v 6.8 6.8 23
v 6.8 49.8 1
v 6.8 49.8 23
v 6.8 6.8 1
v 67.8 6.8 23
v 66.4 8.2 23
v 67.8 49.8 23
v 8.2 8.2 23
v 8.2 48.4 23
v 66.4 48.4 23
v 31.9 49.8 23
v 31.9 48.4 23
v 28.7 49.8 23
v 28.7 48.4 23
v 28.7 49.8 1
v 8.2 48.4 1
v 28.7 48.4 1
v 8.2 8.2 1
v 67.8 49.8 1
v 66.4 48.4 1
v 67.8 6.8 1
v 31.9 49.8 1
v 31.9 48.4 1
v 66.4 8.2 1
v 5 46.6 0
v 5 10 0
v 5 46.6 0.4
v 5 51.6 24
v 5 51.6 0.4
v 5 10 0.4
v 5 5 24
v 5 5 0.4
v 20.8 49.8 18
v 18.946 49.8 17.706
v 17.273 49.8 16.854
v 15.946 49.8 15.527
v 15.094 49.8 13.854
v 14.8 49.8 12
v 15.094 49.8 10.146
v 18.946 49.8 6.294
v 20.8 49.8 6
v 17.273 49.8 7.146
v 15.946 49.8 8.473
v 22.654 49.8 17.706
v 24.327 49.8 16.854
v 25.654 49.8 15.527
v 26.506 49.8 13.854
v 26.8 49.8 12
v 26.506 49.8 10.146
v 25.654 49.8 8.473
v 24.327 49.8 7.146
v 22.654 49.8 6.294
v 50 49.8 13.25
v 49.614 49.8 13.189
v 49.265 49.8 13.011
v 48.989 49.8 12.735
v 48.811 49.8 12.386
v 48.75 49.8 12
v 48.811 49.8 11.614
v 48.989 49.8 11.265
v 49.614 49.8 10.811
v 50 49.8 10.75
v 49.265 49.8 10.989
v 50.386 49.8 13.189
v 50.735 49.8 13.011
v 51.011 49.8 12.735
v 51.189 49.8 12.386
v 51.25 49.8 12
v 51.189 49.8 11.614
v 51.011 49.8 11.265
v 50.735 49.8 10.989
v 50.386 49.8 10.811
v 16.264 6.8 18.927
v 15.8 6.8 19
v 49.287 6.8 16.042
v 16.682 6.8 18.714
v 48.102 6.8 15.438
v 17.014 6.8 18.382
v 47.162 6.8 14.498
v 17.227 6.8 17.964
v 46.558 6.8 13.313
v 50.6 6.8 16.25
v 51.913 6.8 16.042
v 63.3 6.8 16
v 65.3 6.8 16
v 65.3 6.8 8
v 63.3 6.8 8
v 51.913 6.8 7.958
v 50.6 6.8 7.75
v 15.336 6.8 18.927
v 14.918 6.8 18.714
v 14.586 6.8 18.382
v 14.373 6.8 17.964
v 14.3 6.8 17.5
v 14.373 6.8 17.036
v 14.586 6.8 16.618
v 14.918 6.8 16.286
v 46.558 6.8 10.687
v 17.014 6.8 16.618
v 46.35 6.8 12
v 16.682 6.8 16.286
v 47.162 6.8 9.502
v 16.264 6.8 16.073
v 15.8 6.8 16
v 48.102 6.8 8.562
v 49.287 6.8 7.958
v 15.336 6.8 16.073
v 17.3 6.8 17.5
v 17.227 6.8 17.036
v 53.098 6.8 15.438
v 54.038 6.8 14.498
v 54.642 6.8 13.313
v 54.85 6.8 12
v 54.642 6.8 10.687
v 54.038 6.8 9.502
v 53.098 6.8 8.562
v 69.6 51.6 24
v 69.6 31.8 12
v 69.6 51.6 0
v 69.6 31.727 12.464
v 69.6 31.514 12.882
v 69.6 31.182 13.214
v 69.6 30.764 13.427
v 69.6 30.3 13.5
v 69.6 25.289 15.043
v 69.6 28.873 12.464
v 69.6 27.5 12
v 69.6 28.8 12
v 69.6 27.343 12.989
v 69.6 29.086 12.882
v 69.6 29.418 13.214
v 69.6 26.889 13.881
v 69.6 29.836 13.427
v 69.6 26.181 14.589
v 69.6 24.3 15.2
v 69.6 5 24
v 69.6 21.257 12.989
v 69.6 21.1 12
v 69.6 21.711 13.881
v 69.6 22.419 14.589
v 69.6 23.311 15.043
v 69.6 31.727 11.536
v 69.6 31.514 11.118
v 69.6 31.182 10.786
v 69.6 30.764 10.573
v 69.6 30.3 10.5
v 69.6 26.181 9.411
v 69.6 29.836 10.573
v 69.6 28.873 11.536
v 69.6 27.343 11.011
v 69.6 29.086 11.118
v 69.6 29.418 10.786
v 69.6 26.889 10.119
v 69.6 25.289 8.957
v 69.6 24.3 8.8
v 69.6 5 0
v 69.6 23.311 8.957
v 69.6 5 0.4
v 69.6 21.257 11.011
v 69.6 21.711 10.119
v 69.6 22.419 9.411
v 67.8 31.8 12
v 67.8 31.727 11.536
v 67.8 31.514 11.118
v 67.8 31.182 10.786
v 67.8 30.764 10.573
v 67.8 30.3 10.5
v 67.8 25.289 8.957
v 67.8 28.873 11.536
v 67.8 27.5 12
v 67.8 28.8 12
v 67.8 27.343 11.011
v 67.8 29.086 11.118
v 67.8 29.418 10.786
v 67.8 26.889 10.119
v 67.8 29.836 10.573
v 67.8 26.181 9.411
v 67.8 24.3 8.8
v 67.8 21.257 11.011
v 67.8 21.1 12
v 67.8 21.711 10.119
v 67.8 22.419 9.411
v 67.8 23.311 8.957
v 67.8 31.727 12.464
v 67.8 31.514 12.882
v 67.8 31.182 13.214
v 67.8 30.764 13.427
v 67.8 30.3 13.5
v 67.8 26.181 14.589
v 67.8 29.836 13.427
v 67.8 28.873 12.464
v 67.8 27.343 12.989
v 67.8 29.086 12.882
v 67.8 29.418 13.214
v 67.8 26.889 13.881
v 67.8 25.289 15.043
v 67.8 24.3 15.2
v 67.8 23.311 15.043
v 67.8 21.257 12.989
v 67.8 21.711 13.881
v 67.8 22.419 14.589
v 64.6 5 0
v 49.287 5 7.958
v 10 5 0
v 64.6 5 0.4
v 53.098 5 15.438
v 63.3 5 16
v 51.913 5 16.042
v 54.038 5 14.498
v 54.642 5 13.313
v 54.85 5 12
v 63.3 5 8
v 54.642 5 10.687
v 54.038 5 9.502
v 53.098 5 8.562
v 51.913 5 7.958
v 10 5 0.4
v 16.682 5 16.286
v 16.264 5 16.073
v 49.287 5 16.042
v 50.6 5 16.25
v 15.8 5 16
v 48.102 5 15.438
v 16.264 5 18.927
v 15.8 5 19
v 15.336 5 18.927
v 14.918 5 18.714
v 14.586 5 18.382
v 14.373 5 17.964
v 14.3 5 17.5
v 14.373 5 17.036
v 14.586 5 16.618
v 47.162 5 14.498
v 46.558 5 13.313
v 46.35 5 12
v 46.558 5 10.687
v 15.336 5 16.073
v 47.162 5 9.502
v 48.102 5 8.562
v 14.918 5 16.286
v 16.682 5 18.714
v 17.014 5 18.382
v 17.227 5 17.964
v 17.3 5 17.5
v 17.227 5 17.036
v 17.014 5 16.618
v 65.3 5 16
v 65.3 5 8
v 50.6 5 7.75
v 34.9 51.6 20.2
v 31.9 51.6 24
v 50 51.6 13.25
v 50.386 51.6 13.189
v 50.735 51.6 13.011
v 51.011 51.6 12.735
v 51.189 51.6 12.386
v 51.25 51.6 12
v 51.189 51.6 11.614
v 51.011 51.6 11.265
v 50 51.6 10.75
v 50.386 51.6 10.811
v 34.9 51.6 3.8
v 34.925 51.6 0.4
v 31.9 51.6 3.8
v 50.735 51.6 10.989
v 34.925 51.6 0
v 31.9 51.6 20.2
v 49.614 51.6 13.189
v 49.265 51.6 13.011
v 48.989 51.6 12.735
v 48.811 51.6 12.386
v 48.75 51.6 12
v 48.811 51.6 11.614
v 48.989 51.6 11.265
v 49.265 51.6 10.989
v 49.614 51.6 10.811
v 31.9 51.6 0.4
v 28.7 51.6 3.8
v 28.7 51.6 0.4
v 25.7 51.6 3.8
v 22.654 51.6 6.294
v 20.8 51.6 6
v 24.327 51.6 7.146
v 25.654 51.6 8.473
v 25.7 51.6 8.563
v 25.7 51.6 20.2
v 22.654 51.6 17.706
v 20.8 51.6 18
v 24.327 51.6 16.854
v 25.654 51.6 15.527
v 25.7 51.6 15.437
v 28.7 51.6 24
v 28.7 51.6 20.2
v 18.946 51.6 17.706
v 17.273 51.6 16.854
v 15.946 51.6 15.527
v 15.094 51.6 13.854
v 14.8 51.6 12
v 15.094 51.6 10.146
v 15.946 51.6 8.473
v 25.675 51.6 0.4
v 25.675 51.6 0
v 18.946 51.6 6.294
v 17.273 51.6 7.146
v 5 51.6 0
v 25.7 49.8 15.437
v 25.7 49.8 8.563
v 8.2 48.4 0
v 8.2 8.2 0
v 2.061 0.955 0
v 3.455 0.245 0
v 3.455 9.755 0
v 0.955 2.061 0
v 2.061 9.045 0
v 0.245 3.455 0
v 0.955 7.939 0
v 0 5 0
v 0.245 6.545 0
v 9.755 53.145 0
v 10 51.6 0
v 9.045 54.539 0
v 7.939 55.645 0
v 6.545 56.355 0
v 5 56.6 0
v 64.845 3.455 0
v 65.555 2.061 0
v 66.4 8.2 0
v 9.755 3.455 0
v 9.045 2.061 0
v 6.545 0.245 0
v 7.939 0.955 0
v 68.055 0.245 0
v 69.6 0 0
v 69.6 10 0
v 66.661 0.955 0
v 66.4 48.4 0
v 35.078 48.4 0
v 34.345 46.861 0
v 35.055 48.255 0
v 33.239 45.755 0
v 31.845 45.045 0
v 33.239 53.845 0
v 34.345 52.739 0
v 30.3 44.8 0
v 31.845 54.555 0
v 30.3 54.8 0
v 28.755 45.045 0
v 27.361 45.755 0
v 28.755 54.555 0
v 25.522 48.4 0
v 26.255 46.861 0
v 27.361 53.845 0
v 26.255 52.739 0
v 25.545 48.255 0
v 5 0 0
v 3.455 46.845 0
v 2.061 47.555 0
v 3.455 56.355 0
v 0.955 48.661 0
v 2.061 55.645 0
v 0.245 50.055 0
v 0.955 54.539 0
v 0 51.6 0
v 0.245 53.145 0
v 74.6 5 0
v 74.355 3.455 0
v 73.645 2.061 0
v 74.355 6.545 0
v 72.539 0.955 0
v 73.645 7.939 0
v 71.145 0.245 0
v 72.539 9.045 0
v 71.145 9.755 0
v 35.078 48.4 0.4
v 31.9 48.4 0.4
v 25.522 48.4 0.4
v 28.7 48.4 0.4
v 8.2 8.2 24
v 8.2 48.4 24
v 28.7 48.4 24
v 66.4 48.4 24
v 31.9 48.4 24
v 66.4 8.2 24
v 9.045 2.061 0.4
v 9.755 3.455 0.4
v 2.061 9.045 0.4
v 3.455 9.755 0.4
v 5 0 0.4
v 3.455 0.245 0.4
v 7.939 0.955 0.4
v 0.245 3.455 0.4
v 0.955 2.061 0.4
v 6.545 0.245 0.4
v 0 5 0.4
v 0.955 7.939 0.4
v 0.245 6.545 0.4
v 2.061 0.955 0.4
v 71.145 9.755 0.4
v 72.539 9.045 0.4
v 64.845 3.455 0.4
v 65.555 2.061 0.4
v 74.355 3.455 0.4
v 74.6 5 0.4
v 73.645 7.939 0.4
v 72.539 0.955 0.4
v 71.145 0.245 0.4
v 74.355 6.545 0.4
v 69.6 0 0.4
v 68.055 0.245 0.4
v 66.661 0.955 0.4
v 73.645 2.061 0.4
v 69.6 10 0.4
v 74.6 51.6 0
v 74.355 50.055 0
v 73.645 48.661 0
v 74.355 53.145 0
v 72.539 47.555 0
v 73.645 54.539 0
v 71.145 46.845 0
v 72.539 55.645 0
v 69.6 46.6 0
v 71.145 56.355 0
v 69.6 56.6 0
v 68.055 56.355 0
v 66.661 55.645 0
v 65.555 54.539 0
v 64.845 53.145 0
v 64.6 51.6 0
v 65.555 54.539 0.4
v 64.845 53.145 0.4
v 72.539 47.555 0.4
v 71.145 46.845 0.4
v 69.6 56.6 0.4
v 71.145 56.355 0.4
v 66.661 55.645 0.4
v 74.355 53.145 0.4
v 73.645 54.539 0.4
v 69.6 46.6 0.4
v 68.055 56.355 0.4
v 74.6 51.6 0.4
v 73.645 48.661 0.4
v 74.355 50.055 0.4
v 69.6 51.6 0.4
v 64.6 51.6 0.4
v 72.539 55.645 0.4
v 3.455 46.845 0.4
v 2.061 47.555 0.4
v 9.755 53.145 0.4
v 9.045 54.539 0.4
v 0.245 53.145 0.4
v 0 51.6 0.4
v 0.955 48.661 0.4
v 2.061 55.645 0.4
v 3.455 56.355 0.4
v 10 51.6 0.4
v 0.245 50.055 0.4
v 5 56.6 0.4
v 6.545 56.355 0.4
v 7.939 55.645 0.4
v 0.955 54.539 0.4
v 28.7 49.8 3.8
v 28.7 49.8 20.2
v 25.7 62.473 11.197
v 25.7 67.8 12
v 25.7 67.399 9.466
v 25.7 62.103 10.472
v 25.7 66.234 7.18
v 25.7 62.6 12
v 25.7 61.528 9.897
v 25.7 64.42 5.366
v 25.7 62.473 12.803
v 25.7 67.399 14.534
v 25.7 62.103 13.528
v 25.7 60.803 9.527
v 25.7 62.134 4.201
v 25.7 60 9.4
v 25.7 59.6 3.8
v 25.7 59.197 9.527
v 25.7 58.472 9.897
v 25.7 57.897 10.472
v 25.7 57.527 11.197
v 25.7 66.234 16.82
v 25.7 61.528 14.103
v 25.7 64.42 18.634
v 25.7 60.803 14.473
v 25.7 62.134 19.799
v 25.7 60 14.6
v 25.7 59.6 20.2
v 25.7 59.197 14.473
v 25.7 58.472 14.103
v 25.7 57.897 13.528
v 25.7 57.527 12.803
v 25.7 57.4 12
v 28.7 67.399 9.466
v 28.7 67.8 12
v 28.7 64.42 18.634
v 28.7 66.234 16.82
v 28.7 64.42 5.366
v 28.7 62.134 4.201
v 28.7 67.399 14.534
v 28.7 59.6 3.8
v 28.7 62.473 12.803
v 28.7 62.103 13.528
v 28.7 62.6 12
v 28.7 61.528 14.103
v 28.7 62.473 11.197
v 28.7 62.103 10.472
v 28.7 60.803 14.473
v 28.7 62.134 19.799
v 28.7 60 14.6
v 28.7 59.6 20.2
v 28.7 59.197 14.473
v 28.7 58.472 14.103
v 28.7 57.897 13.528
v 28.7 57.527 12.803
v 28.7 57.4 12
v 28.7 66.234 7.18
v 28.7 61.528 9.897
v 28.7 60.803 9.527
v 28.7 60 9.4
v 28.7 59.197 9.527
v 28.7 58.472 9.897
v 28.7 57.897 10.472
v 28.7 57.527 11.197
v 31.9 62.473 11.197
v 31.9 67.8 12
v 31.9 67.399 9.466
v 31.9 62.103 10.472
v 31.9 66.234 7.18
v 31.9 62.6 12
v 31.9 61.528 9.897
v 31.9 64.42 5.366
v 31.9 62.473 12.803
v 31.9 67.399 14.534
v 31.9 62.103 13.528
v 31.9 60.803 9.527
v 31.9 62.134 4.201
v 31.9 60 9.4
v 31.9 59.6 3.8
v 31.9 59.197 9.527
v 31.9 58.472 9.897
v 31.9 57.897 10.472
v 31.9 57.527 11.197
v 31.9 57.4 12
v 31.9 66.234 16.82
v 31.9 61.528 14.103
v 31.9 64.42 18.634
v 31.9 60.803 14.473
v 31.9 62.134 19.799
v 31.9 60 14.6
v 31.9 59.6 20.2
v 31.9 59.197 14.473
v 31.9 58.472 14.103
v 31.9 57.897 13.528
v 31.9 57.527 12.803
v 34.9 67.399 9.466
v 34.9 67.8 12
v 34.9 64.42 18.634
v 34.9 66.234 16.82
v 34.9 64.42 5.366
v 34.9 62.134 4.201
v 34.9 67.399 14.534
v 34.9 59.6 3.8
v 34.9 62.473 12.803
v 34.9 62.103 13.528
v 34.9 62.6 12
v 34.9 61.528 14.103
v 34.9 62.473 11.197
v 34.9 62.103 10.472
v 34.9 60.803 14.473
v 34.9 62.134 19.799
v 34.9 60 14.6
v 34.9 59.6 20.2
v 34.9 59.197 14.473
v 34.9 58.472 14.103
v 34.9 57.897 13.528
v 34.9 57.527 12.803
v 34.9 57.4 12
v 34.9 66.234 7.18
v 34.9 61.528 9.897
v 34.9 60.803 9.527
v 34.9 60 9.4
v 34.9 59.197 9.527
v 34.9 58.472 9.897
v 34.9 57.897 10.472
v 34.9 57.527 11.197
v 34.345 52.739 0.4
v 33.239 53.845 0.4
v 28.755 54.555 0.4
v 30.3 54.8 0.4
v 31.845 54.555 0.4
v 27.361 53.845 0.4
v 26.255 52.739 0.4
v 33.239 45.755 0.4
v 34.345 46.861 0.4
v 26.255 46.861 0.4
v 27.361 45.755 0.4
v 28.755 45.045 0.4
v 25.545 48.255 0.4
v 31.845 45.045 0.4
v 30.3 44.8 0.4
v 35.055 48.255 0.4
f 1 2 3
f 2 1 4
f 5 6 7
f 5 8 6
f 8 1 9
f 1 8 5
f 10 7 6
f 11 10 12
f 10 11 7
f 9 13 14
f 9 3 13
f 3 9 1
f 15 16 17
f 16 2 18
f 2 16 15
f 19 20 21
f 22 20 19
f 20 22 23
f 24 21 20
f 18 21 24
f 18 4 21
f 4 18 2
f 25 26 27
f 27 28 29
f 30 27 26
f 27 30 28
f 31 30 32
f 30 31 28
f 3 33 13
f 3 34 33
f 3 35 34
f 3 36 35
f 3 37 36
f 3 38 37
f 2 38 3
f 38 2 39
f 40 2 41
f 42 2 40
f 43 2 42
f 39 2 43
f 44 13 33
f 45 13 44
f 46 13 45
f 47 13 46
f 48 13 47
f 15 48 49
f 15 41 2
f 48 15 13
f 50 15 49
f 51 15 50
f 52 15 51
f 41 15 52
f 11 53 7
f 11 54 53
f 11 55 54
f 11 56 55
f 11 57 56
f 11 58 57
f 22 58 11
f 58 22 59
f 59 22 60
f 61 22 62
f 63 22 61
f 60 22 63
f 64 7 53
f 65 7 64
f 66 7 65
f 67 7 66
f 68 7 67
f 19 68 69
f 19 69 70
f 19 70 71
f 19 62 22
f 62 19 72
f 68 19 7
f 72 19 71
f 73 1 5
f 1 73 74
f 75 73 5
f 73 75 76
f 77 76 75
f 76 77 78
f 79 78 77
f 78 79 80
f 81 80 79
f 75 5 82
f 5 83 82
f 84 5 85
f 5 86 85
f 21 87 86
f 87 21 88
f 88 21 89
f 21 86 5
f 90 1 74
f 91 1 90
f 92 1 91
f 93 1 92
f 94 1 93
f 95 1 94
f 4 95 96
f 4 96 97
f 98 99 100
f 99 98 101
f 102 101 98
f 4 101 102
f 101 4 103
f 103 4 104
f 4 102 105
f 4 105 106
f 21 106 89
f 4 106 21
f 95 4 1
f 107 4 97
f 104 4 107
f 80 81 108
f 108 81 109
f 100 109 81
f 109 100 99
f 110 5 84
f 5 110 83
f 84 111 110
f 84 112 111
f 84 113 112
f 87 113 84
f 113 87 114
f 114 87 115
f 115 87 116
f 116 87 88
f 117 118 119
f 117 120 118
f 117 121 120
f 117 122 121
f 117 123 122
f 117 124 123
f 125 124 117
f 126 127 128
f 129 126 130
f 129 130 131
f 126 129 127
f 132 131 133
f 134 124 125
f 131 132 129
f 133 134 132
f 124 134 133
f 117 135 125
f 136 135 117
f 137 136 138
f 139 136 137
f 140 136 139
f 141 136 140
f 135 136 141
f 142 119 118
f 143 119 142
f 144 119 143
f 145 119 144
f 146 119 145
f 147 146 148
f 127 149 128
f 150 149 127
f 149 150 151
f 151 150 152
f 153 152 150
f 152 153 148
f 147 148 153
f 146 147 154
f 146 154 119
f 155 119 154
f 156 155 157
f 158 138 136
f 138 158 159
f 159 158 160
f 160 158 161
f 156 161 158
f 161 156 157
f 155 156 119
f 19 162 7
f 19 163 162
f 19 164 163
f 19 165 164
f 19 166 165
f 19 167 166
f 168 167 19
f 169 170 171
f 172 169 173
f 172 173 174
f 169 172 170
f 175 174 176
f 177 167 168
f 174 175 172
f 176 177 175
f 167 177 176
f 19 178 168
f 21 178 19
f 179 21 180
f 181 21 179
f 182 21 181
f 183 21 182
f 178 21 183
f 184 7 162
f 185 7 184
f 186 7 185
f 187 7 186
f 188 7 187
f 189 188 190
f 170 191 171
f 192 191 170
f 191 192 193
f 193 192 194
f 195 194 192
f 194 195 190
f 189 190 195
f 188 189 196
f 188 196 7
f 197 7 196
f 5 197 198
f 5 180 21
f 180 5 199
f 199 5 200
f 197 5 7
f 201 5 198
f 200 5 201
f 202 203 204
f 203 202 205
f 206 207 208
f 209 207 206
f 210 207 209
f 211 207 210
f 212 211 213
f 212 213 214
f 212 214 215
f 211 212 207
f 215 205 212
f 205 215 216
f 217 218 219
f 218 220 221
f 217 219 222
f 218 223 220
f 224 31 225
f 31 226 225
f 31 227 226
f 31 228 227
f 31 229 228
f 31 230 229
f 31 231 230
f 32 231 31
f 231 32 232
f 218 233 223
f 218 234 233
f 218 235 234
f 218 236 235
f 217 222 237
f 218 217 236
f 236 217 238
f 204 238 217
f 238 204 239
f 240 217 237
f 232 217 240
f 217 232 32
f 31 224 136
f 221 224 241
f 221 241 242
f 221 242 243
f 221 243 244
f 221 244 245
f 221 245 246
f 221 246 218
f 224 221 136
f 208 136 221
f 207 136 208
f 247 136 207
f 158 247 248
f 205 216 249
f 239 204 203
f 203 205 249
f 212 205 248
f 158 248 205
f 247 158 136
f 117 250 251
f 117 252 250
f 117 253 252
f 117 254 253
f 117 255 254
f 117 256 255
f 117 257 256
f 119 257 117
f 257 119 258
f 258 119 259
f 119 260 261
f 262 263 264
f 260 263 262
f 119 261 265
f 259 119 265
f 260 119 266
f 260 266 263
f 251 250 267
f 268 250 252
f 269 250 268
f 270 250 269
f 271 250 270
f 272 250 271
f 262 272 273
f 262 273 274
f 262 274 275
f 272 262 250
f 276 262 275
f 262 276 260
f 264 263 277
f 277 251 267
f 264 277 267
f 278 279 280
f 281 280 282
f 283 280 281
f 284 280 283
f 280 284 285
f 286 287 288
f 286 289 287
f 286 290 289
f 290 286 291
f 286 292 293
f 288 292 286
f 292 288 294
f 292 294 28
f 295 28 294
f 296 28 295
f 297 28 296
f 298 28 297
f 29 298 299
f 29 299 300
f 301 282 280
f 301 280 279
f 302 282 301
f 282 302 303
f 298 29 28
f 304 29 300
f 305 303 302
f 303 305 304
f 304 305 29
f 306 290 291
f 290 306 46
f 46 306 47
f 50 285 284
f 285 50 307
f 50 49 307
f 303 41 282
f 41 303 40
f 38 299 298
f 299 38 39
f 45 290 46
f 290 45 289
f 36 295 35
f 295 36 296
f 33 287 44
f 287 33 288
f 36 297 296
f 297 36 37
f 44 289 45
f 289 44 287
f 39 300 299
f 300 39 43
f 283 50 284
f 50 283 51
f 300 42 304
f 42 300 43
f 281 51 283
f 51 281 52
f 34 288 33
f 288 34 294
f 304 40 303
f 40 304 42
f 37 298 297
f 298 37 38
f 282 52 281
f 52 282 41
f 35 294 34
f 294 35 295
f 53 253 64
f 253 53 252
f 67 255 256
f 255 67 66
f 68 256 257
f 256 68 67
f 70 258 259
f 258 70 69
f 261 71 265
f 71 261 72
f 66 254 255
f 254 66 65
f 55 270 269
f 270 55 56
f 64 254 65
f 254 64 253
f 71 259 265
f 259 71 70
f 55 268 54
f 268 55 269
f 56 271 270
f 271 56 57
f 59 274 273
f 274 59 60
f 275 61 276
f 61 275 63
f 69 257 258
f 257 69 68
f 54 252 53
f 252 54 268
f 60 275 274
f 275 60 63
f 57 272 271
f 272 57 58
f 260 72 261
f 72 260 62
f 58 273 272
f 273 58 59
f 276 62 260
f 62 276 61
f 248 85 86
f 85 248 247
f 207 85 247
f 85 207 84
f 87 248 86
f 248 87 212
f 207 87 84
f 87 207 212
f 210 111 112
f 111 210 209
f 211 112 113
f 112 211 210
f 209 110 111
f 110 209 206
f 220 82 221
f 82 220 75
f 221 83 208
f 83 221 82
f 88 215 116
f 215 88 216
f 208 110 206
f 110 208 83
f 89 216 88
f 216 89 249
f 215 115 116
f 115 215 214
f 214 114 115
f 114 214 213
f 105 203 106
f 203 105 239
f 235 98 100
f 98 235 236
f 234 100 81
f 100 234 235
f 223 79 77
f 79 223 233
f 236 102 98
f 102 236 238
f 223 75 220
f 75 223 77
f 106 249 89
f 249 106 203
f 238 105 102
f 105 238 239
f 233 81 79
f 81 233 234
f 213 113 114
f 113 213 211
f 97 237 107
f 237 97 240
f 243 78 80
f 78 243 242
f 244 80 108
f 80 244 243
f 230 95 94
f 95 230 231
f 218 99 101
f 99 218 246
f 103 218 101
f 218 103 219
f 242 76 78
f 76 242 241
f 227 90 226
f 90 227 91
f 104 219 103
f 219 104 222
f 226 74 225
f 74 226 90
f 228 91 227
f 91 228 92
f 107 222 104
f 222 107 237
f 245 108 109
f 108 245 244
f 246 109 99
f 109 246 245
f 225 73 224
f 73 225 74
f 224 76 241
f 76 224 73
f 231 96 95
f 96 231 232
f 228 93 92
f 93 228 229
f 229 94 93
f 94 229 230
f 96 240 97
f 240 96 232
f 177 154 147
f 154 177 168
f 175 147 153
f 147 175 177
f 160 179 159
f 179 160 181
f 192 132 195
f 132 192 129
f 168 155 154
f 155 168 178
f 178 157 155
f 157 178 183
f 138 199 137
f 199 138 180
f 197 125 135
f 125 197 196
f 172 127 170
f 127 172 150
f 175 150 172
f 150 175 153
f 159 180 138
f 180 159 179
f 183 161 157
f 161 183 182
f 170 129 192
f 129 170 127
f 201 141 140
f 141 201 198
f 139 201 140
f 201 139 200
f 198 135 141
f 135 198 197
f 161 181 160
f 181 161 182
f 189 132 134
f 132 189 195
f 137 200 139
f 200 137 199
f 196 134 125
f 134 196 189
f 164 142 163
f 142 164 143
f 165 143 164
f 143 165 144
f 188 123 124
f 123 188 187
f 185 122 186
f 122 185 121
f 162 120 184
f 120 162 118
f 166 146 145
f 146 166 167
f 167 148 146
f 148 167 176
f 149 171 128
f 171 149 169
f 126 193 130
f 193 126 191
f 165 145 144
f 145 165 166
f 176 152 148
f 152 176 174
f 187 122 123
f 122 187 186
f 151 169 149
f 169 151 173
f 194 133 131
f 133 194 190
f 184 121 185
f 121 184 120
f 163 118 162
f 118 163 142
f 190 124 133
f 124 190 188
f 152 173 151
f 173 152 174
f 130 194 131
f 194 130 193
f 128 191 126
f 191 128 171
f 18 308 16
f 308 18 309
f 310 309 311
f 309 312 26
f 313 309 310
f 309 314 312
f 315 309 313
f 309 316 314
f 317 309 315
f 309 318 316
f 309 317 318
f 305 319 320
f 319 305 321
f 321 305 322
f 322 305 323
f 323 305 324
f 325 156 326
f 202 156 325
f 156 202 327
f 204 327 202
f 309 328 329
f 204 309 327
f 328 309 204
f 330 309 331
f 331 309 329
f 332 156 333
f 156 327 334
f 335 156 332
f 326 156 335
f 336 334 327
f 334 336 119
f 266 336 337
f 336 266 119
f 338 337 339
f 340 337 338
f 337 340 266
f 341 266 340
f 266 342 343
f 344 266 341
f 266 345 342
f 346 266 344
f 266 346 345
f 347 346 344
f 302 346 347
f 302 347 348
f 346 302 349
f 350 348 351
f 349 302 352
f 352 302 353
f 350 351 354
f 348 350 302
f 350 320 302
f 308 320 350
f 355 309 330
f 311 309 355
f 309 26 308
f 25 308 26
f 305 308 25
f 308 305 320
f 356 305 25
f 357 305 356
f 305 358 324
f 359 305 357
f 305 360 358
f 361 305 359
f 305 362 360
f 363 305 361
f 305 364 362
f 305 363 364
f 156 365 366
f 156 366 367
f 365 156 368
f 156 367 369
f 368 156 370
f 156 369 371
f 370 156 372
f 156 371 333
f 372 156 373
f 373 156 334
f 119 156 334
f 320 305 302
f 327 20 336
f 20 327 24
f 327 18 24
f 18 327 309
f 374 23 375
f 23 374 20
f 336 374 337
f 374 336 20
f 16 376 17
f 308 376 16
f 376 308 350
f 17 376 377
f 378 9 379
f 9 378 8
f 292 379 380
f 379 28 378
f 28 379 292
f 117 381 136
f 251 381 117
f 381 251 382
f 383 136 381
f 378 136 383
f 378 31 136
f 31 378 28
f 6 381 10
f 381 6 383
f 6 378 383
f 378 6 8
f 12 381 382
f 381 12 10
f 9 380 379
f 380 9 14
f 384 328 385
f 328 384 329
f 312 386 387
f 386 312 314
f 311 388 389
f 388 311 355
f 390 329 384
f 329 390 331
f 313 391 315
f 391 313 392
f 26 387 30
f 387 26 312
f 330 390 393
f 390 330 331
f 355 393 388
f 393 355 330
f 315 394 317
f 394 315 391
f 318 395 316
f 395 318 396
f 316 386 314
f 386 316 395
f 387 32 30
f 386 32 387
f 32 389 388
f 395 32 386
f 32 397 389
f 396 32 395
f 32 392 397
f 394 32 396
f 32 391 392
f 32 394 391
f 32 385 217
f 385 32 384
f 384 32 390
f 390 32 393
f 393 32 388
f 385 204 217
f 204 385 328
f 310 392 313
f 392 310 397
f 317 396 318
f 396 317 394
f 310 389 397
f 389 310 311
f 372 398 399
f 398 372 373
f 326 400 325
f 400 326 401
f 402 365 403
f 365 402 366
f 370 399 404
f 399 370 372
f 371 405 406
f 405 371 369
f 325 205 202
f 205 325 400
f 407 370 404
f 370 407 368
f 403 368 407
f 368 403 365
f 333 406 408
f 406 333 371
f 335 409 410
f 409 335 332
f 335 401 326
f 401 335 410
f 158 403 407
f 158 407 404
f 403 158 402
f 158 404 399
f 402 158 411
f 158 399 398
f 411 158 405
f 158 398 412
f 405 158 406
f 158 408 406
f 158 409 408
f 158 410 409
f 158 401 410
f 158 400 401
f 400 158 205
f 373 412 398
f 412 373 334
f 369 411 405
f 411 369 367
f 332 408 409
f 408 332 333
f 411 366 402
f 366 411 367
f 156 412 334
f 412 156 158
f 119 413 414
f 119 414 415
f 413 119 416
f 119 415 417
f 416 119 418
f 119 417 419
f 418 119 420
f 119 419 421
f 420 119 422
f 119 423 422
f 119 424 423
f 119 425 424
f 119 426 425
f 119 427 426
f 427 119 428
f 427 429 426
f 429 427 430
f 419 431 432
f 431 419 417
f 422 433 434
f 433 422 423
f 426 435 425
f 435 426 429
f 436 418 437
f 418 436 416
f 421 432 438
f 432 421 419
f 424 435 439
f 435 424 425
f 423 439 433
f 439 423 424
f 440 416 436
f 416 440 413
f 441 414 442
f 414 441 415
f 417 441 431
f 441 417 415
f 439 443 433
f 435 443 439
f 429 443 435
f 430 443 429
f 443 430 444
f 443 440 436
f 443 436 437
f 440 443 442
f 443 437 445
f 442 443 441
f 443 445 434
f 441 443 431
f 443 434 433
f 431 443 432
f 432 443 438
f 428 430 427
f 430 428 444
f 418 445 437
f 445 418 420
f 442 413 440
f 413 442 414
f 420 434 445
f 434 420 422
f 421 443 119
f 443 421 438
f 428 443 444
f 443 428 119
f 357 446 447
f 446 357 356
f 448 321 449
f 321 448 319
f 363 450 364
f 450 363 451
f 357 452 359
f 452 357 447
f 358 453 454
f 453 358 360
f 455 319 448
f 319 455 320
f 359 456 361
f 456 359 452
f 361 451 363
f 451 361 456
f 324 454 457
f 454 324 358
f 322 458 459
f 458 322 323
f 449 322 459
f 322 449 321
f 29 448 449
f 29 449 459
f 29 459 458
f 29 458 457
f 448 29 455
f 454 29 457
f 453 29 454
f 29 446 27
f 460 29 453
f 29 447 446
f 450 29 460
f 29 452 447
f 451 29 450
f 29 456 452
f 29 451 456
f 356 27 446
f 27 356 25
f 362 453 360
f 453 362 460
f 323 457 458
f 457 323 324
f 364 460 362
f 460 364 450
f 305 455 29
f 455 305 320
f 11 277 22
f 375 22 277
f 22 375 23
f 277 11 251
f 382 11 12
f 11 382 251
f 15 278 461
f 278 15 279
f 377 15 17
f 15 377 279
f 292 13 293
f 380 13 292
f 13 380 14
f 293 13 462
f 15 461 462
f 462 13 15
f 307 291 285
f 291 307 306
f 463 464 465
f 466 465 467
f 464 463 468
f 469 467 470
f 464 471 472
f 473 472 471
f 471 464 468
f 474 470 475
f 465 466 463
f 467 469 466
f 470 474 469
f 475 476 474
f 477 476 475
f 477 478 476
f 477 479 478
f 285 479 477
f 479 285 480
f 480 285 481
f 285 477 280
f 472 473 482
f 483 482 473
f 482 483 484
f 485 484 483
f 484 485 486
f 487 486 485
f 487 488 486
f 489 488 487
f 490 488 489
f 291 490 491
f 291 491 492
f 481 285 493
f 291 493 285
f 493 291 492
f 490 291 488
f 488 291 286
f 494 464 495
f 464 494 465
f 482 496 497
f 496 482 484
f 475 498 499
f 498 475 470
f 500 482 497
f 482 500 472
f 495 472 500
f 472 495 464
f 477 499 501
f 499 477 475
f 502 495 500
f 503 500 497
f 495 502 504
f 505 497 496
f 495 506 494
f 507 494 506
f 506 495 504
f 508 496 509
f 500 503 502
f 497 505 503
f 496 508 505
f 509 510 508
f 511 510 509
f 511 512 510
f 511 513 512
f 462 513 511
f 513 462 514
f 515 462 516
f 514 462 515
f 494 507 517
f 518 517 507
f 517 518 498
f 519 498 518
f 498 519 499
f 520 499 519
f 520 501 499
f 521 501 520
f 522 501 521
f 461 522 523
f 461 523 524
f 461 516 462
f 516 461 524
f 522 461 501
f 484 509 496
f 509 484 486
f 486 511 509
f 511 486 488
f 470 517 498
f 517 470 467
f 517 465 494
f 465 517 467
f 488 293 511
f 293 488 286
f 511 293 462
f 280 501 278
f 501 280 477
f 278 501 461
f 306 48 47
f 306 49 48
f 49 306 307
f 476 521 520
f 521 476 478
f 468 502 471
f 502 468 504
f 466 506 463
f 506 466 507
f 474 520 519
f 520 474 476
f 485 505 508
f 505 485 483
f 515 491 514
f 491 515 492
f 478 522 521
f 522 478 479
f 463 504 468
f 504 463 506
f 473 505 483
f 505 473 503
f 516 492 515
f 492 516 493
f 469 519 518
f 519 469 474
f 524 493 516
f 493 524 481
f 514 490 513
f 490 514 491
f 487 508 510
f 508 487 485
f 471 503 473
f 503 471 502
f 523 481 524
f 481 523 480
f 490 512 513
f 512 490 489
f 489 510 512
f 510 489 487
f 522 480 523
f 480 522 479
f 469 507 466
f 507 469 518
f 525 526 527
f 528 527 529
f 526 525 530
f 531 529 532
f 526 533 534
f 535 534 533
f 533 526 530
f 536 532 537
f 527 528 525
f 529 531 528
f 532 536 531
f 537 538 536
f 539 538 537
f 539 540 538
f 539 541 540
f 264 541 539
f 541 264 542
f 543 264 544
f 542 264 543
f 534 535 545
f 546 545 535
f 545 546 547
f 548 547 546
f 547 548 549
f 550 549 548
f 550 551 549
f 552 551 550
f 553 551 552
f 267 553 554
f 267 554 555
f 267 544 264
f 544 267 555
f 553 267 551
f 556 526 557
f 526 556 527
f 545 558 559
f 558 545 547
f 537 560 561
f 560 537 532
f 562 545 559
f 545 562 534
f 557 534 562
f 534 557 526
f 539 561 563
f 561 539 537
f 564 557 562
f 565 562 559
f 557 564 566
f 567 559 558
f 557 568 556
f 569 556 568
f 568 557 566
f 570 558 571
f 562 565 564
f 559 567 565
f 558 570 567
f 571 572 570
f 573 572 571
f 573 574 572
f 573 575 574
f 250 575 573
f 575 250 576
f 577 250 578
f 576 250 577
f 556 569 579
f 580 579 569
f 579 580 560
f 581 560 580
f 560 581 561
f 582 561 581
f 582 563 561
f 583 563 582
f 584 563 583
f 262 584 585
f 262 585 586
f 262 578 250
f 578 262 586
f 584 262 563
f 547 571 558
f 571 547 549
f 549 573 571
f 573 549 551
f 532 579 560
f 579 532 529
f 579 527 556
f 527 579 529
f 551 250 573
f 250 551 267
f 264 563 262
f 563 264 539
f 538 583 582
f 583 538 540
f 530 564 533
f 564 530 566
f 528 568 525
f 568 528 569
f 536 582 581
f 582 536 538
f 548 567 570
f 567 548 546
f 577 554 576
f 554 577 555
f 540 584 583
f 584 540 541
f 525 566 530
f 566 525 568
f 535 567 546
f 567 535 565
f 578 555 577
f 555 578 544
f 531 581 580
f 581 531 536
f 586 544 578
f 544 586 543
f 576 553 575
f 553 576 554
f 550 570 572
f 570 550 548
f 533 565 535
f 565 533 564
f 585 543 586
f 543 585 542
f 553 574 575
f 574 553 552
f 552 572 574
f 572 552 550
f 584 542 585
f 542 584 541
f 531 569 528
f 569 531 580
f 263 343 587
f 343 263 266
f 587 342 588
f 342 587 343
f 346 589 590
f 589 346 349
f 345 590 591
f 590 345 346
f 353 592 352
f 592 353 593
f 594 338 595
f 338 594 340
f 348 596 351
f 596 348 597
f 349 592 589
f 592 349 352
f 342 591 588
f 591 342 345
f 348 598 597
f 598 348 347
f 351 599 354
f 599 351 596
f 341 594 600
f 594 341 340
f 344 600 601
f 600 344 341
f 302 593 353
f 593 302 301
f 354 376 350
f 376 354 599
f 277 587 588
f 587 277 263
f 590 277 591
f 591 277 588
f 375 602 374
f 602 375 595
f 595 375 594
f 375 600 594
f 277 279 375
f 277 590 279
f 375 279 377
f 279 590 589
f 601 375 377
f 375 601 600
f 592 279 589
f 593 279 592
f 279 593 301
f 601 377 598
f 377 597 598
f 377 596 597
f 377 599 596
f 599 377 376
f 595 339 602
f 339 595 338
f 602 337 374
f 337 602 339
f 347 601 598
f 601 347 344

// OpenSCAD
/*
 * Created by:
 * Thomas Buck <xythobuz@xythobuz.de> in May 2016
 *
 * Licensed under the
 * Creative Commons - Attribution - Share Alike license.
 */

// -----------------------------------------------------------

cam_width = 61; // 60.5
cam_depth = 22; // 21.3
cam_height = 43; // 42.1

button_size = 12;
button_dist = 14;

mic_hole = 2.5;
mic_hole_dist = 17.8;
mic_hole_2_width = 2;
mic_hole_2_height = 8;
mic_hole_2_dist = 4.5;

bottom_hole = 8.5;
bottom_hole_dist = 17.2;
light_hole = 3;
light_hole_dist_x = 9;
light_hole_dist_y = 5.5;

wifi_hole = 6.4;
wifi_hole_dist = 17.5;
wifi_hole_2 = 3;
wifi_hole_2_dist = 6;

mount_width = 3; // 3.1
mount_gap = 3.2; // 3.1
mount_depth = 16.4; // 16.4
mount_height = 16.2; // 16.1
mount_hole = 5.2; // 5
mount_hole_dist = 7.8; // 7.7
mount_offset = -7; // -7

wall_size = 1.8;
lip_height = 1;
lip_width = 1.4;

print_support_size = 10;
print_support_height = 0.4;

$fn = 20;

// -----------------------------------------------------------

module print_support() {
    difference() {
        cylinder(d = print_support_size, h = print_support_height);
        translate([0, 0, -1])
            cube([print_support_size / 2, print_support_size / 2, print_support_height + 2]);
    }
}

module half_cylinder(d, h) {
    rotate([0, 0, 180])
    difference() {
        cylinder(d = d, h = h);
        translate([-(d / 2), 0, -1])
            cube([d, d / 2, h + 2]);
    }
}

module frame() {
    // left wall
    translate([0, wall_size, 0])
        cube([wall_size, cam_height, cam_depth]);
    
    // right wall
    translate([wall_size + cam_width, wall_size, 0])
        cube([wall_size, cam_height, cam_depth]);
    
    // bottom wall
    cube([cam_width + (2 * wall_size), wall_size, cam_depth]);
    
    // top wall
    translate([0, wall_size + cam_height, 0])
        cube([cam_width + (2 * wall_size), wall_size, cam_depth]);
}

module frameWithButton() {
    difference() {
        frame();
        
        // button
        translate([wall_size + button_dist, (2 * wall_size) + cam_height + 1, cam_depth / 2])
            rotate([90, 0, 0])
            cylinder(d = button_size, h = wall_size + 2);
        
        // mic hole
        translate([wall_size + cam_width - mic_hole_dist, (2 * wall_size) + cam_height + 1, cam_depth / 2])
            rotate([90, 0, 0])
            cylinder(d = mic_hole, h = wall_size + 2);
        
        // mic slit
        translate([wall_size + cam_width - mic_hole_2_dist, -1, (cam_depth - mic_hole_2_height) / 2])
            cube([mic_hole_2_width, wall_size + 2, mic_hole_2_height]);
        
        // bottom hole
        translate([wall_size + cam_width - bottom_hole_dist, wall_size + 1, cam_depth / 2])
            rotate([90, 0, 0])
            cylinder(d = bottom_hole, h = wall_size + 2);
        
        // light hole
        translate([wall_size + light_hole_dist_x, wall_size + 1, cam_depth - light_hole_dist_y])
            rotate([90, 0, 0])
            cylinder(d = light_hole, h = wall_size + 2);
        
        // wifi hole
        translate([wall_size + cam_width - 1, wall_size + wifi_hole_dist, cam_depth / 2])
            rotate([0, 90, 0])
            cylinder(d = wifi_hole, h = wall_size + 2);
            
        // wifi light hole
        translate([wall_size + cam_width - 1, wall_size + wifi_hole_dist + wifi_hole_2_dist, cam_depth / 2])
            rotate([0, 90, 0])
            cylinder(d = wifi_hole_2, h = wall_size + 2);
    }
}

module lip() {
    // left lip
    translate([0, wall_size, 0])
        cube([wall_size + lip_width, cam_height, lip_height]);
    
    // right lip
    translate([wall_size + cam_width - lip_width, wall_size, 0])
        cube([wall_size + lip_width, cam_height, lip_height]);
    
    // bottom lip
    cube([cam_width + (2 * wall_size), wall_size + lip_width, lip_height]);
    
    // top lip
    translate([0, wall_size + cam_height - lip_width, 0])
        cube([cam_width + (2 * wall_size), wall_size + lip_width, lip_height]);
}

module frameLips() {
    translate([0, 0, lip_height])
        frameWithButton();
    
    lip();
    
    translate([0, 0, cam_depth + lip_height])
        lip();
    
    print_support();
    
    translate([cam_width + (2 * wall_size), 0, 0])
        rotate([0, 0, 90])
        print_support();
    
    translate([cam_width + (2 * wall_size), cam_height + (2 * wall_size), 0])
        rotate([0, 0, 180])
        print_support();
    
    translate([0, cam_height + (2 * wall_size), 0])
        rotate([0, 0, 270])
        print_support();
}

module mountArm() {
    difference() {
        union() {
            translate([0, mount_height - (mount_depth / 2), 0])
                rotate([0, 90, 0])
                half_cylinder(mount_depth, mount_width);
            
            translate([0, -wall_size, -(mount_depth / 2)])
                cube([mount_width, mount_height - (mount_depth / 2) + wall_size, mount_depth]);
        }
        
        translate([-1, mount_height - mount_hole_dist, 0])
            rotate([0, 90, 0])
            cylinder(d = mount_hole, h = mount_width + 2);
    }
}

module mount() {
    mountArm();
    
    translate([mount_width + mount_gap, 0, 0])
        mountArm();
}

module cover() {
    difference() {
        frameLips();
        translate([wall_size + ((cam_width - (mount_gap + (2 * mount_width))) / 2) + mount_offset + mount_width, wall_size + cam_height - lip_width - 1, -1])
            cube([mount_gap, wall_size + lip_width + 2, cam_depth + (2 * lip_height) + 2]);
    }

    translate([wall_size + ((cam_width - (mount_gap + (2 * mount_width))) / 2) + mount_offset, (2 * wall_size) + cam_height, lip_height + (cam_depth / 2)])
        mount();
    
    translate([wall_size + (cam_width / 2) + mount_offset, wall_size + cam_height, 0])
        cylinder(d = print_support_size, h = print_support_height);
}

// -----------------------------------------------------------

translate([print_support_size / 2, print_support_size / 2, 0])
    cover();
